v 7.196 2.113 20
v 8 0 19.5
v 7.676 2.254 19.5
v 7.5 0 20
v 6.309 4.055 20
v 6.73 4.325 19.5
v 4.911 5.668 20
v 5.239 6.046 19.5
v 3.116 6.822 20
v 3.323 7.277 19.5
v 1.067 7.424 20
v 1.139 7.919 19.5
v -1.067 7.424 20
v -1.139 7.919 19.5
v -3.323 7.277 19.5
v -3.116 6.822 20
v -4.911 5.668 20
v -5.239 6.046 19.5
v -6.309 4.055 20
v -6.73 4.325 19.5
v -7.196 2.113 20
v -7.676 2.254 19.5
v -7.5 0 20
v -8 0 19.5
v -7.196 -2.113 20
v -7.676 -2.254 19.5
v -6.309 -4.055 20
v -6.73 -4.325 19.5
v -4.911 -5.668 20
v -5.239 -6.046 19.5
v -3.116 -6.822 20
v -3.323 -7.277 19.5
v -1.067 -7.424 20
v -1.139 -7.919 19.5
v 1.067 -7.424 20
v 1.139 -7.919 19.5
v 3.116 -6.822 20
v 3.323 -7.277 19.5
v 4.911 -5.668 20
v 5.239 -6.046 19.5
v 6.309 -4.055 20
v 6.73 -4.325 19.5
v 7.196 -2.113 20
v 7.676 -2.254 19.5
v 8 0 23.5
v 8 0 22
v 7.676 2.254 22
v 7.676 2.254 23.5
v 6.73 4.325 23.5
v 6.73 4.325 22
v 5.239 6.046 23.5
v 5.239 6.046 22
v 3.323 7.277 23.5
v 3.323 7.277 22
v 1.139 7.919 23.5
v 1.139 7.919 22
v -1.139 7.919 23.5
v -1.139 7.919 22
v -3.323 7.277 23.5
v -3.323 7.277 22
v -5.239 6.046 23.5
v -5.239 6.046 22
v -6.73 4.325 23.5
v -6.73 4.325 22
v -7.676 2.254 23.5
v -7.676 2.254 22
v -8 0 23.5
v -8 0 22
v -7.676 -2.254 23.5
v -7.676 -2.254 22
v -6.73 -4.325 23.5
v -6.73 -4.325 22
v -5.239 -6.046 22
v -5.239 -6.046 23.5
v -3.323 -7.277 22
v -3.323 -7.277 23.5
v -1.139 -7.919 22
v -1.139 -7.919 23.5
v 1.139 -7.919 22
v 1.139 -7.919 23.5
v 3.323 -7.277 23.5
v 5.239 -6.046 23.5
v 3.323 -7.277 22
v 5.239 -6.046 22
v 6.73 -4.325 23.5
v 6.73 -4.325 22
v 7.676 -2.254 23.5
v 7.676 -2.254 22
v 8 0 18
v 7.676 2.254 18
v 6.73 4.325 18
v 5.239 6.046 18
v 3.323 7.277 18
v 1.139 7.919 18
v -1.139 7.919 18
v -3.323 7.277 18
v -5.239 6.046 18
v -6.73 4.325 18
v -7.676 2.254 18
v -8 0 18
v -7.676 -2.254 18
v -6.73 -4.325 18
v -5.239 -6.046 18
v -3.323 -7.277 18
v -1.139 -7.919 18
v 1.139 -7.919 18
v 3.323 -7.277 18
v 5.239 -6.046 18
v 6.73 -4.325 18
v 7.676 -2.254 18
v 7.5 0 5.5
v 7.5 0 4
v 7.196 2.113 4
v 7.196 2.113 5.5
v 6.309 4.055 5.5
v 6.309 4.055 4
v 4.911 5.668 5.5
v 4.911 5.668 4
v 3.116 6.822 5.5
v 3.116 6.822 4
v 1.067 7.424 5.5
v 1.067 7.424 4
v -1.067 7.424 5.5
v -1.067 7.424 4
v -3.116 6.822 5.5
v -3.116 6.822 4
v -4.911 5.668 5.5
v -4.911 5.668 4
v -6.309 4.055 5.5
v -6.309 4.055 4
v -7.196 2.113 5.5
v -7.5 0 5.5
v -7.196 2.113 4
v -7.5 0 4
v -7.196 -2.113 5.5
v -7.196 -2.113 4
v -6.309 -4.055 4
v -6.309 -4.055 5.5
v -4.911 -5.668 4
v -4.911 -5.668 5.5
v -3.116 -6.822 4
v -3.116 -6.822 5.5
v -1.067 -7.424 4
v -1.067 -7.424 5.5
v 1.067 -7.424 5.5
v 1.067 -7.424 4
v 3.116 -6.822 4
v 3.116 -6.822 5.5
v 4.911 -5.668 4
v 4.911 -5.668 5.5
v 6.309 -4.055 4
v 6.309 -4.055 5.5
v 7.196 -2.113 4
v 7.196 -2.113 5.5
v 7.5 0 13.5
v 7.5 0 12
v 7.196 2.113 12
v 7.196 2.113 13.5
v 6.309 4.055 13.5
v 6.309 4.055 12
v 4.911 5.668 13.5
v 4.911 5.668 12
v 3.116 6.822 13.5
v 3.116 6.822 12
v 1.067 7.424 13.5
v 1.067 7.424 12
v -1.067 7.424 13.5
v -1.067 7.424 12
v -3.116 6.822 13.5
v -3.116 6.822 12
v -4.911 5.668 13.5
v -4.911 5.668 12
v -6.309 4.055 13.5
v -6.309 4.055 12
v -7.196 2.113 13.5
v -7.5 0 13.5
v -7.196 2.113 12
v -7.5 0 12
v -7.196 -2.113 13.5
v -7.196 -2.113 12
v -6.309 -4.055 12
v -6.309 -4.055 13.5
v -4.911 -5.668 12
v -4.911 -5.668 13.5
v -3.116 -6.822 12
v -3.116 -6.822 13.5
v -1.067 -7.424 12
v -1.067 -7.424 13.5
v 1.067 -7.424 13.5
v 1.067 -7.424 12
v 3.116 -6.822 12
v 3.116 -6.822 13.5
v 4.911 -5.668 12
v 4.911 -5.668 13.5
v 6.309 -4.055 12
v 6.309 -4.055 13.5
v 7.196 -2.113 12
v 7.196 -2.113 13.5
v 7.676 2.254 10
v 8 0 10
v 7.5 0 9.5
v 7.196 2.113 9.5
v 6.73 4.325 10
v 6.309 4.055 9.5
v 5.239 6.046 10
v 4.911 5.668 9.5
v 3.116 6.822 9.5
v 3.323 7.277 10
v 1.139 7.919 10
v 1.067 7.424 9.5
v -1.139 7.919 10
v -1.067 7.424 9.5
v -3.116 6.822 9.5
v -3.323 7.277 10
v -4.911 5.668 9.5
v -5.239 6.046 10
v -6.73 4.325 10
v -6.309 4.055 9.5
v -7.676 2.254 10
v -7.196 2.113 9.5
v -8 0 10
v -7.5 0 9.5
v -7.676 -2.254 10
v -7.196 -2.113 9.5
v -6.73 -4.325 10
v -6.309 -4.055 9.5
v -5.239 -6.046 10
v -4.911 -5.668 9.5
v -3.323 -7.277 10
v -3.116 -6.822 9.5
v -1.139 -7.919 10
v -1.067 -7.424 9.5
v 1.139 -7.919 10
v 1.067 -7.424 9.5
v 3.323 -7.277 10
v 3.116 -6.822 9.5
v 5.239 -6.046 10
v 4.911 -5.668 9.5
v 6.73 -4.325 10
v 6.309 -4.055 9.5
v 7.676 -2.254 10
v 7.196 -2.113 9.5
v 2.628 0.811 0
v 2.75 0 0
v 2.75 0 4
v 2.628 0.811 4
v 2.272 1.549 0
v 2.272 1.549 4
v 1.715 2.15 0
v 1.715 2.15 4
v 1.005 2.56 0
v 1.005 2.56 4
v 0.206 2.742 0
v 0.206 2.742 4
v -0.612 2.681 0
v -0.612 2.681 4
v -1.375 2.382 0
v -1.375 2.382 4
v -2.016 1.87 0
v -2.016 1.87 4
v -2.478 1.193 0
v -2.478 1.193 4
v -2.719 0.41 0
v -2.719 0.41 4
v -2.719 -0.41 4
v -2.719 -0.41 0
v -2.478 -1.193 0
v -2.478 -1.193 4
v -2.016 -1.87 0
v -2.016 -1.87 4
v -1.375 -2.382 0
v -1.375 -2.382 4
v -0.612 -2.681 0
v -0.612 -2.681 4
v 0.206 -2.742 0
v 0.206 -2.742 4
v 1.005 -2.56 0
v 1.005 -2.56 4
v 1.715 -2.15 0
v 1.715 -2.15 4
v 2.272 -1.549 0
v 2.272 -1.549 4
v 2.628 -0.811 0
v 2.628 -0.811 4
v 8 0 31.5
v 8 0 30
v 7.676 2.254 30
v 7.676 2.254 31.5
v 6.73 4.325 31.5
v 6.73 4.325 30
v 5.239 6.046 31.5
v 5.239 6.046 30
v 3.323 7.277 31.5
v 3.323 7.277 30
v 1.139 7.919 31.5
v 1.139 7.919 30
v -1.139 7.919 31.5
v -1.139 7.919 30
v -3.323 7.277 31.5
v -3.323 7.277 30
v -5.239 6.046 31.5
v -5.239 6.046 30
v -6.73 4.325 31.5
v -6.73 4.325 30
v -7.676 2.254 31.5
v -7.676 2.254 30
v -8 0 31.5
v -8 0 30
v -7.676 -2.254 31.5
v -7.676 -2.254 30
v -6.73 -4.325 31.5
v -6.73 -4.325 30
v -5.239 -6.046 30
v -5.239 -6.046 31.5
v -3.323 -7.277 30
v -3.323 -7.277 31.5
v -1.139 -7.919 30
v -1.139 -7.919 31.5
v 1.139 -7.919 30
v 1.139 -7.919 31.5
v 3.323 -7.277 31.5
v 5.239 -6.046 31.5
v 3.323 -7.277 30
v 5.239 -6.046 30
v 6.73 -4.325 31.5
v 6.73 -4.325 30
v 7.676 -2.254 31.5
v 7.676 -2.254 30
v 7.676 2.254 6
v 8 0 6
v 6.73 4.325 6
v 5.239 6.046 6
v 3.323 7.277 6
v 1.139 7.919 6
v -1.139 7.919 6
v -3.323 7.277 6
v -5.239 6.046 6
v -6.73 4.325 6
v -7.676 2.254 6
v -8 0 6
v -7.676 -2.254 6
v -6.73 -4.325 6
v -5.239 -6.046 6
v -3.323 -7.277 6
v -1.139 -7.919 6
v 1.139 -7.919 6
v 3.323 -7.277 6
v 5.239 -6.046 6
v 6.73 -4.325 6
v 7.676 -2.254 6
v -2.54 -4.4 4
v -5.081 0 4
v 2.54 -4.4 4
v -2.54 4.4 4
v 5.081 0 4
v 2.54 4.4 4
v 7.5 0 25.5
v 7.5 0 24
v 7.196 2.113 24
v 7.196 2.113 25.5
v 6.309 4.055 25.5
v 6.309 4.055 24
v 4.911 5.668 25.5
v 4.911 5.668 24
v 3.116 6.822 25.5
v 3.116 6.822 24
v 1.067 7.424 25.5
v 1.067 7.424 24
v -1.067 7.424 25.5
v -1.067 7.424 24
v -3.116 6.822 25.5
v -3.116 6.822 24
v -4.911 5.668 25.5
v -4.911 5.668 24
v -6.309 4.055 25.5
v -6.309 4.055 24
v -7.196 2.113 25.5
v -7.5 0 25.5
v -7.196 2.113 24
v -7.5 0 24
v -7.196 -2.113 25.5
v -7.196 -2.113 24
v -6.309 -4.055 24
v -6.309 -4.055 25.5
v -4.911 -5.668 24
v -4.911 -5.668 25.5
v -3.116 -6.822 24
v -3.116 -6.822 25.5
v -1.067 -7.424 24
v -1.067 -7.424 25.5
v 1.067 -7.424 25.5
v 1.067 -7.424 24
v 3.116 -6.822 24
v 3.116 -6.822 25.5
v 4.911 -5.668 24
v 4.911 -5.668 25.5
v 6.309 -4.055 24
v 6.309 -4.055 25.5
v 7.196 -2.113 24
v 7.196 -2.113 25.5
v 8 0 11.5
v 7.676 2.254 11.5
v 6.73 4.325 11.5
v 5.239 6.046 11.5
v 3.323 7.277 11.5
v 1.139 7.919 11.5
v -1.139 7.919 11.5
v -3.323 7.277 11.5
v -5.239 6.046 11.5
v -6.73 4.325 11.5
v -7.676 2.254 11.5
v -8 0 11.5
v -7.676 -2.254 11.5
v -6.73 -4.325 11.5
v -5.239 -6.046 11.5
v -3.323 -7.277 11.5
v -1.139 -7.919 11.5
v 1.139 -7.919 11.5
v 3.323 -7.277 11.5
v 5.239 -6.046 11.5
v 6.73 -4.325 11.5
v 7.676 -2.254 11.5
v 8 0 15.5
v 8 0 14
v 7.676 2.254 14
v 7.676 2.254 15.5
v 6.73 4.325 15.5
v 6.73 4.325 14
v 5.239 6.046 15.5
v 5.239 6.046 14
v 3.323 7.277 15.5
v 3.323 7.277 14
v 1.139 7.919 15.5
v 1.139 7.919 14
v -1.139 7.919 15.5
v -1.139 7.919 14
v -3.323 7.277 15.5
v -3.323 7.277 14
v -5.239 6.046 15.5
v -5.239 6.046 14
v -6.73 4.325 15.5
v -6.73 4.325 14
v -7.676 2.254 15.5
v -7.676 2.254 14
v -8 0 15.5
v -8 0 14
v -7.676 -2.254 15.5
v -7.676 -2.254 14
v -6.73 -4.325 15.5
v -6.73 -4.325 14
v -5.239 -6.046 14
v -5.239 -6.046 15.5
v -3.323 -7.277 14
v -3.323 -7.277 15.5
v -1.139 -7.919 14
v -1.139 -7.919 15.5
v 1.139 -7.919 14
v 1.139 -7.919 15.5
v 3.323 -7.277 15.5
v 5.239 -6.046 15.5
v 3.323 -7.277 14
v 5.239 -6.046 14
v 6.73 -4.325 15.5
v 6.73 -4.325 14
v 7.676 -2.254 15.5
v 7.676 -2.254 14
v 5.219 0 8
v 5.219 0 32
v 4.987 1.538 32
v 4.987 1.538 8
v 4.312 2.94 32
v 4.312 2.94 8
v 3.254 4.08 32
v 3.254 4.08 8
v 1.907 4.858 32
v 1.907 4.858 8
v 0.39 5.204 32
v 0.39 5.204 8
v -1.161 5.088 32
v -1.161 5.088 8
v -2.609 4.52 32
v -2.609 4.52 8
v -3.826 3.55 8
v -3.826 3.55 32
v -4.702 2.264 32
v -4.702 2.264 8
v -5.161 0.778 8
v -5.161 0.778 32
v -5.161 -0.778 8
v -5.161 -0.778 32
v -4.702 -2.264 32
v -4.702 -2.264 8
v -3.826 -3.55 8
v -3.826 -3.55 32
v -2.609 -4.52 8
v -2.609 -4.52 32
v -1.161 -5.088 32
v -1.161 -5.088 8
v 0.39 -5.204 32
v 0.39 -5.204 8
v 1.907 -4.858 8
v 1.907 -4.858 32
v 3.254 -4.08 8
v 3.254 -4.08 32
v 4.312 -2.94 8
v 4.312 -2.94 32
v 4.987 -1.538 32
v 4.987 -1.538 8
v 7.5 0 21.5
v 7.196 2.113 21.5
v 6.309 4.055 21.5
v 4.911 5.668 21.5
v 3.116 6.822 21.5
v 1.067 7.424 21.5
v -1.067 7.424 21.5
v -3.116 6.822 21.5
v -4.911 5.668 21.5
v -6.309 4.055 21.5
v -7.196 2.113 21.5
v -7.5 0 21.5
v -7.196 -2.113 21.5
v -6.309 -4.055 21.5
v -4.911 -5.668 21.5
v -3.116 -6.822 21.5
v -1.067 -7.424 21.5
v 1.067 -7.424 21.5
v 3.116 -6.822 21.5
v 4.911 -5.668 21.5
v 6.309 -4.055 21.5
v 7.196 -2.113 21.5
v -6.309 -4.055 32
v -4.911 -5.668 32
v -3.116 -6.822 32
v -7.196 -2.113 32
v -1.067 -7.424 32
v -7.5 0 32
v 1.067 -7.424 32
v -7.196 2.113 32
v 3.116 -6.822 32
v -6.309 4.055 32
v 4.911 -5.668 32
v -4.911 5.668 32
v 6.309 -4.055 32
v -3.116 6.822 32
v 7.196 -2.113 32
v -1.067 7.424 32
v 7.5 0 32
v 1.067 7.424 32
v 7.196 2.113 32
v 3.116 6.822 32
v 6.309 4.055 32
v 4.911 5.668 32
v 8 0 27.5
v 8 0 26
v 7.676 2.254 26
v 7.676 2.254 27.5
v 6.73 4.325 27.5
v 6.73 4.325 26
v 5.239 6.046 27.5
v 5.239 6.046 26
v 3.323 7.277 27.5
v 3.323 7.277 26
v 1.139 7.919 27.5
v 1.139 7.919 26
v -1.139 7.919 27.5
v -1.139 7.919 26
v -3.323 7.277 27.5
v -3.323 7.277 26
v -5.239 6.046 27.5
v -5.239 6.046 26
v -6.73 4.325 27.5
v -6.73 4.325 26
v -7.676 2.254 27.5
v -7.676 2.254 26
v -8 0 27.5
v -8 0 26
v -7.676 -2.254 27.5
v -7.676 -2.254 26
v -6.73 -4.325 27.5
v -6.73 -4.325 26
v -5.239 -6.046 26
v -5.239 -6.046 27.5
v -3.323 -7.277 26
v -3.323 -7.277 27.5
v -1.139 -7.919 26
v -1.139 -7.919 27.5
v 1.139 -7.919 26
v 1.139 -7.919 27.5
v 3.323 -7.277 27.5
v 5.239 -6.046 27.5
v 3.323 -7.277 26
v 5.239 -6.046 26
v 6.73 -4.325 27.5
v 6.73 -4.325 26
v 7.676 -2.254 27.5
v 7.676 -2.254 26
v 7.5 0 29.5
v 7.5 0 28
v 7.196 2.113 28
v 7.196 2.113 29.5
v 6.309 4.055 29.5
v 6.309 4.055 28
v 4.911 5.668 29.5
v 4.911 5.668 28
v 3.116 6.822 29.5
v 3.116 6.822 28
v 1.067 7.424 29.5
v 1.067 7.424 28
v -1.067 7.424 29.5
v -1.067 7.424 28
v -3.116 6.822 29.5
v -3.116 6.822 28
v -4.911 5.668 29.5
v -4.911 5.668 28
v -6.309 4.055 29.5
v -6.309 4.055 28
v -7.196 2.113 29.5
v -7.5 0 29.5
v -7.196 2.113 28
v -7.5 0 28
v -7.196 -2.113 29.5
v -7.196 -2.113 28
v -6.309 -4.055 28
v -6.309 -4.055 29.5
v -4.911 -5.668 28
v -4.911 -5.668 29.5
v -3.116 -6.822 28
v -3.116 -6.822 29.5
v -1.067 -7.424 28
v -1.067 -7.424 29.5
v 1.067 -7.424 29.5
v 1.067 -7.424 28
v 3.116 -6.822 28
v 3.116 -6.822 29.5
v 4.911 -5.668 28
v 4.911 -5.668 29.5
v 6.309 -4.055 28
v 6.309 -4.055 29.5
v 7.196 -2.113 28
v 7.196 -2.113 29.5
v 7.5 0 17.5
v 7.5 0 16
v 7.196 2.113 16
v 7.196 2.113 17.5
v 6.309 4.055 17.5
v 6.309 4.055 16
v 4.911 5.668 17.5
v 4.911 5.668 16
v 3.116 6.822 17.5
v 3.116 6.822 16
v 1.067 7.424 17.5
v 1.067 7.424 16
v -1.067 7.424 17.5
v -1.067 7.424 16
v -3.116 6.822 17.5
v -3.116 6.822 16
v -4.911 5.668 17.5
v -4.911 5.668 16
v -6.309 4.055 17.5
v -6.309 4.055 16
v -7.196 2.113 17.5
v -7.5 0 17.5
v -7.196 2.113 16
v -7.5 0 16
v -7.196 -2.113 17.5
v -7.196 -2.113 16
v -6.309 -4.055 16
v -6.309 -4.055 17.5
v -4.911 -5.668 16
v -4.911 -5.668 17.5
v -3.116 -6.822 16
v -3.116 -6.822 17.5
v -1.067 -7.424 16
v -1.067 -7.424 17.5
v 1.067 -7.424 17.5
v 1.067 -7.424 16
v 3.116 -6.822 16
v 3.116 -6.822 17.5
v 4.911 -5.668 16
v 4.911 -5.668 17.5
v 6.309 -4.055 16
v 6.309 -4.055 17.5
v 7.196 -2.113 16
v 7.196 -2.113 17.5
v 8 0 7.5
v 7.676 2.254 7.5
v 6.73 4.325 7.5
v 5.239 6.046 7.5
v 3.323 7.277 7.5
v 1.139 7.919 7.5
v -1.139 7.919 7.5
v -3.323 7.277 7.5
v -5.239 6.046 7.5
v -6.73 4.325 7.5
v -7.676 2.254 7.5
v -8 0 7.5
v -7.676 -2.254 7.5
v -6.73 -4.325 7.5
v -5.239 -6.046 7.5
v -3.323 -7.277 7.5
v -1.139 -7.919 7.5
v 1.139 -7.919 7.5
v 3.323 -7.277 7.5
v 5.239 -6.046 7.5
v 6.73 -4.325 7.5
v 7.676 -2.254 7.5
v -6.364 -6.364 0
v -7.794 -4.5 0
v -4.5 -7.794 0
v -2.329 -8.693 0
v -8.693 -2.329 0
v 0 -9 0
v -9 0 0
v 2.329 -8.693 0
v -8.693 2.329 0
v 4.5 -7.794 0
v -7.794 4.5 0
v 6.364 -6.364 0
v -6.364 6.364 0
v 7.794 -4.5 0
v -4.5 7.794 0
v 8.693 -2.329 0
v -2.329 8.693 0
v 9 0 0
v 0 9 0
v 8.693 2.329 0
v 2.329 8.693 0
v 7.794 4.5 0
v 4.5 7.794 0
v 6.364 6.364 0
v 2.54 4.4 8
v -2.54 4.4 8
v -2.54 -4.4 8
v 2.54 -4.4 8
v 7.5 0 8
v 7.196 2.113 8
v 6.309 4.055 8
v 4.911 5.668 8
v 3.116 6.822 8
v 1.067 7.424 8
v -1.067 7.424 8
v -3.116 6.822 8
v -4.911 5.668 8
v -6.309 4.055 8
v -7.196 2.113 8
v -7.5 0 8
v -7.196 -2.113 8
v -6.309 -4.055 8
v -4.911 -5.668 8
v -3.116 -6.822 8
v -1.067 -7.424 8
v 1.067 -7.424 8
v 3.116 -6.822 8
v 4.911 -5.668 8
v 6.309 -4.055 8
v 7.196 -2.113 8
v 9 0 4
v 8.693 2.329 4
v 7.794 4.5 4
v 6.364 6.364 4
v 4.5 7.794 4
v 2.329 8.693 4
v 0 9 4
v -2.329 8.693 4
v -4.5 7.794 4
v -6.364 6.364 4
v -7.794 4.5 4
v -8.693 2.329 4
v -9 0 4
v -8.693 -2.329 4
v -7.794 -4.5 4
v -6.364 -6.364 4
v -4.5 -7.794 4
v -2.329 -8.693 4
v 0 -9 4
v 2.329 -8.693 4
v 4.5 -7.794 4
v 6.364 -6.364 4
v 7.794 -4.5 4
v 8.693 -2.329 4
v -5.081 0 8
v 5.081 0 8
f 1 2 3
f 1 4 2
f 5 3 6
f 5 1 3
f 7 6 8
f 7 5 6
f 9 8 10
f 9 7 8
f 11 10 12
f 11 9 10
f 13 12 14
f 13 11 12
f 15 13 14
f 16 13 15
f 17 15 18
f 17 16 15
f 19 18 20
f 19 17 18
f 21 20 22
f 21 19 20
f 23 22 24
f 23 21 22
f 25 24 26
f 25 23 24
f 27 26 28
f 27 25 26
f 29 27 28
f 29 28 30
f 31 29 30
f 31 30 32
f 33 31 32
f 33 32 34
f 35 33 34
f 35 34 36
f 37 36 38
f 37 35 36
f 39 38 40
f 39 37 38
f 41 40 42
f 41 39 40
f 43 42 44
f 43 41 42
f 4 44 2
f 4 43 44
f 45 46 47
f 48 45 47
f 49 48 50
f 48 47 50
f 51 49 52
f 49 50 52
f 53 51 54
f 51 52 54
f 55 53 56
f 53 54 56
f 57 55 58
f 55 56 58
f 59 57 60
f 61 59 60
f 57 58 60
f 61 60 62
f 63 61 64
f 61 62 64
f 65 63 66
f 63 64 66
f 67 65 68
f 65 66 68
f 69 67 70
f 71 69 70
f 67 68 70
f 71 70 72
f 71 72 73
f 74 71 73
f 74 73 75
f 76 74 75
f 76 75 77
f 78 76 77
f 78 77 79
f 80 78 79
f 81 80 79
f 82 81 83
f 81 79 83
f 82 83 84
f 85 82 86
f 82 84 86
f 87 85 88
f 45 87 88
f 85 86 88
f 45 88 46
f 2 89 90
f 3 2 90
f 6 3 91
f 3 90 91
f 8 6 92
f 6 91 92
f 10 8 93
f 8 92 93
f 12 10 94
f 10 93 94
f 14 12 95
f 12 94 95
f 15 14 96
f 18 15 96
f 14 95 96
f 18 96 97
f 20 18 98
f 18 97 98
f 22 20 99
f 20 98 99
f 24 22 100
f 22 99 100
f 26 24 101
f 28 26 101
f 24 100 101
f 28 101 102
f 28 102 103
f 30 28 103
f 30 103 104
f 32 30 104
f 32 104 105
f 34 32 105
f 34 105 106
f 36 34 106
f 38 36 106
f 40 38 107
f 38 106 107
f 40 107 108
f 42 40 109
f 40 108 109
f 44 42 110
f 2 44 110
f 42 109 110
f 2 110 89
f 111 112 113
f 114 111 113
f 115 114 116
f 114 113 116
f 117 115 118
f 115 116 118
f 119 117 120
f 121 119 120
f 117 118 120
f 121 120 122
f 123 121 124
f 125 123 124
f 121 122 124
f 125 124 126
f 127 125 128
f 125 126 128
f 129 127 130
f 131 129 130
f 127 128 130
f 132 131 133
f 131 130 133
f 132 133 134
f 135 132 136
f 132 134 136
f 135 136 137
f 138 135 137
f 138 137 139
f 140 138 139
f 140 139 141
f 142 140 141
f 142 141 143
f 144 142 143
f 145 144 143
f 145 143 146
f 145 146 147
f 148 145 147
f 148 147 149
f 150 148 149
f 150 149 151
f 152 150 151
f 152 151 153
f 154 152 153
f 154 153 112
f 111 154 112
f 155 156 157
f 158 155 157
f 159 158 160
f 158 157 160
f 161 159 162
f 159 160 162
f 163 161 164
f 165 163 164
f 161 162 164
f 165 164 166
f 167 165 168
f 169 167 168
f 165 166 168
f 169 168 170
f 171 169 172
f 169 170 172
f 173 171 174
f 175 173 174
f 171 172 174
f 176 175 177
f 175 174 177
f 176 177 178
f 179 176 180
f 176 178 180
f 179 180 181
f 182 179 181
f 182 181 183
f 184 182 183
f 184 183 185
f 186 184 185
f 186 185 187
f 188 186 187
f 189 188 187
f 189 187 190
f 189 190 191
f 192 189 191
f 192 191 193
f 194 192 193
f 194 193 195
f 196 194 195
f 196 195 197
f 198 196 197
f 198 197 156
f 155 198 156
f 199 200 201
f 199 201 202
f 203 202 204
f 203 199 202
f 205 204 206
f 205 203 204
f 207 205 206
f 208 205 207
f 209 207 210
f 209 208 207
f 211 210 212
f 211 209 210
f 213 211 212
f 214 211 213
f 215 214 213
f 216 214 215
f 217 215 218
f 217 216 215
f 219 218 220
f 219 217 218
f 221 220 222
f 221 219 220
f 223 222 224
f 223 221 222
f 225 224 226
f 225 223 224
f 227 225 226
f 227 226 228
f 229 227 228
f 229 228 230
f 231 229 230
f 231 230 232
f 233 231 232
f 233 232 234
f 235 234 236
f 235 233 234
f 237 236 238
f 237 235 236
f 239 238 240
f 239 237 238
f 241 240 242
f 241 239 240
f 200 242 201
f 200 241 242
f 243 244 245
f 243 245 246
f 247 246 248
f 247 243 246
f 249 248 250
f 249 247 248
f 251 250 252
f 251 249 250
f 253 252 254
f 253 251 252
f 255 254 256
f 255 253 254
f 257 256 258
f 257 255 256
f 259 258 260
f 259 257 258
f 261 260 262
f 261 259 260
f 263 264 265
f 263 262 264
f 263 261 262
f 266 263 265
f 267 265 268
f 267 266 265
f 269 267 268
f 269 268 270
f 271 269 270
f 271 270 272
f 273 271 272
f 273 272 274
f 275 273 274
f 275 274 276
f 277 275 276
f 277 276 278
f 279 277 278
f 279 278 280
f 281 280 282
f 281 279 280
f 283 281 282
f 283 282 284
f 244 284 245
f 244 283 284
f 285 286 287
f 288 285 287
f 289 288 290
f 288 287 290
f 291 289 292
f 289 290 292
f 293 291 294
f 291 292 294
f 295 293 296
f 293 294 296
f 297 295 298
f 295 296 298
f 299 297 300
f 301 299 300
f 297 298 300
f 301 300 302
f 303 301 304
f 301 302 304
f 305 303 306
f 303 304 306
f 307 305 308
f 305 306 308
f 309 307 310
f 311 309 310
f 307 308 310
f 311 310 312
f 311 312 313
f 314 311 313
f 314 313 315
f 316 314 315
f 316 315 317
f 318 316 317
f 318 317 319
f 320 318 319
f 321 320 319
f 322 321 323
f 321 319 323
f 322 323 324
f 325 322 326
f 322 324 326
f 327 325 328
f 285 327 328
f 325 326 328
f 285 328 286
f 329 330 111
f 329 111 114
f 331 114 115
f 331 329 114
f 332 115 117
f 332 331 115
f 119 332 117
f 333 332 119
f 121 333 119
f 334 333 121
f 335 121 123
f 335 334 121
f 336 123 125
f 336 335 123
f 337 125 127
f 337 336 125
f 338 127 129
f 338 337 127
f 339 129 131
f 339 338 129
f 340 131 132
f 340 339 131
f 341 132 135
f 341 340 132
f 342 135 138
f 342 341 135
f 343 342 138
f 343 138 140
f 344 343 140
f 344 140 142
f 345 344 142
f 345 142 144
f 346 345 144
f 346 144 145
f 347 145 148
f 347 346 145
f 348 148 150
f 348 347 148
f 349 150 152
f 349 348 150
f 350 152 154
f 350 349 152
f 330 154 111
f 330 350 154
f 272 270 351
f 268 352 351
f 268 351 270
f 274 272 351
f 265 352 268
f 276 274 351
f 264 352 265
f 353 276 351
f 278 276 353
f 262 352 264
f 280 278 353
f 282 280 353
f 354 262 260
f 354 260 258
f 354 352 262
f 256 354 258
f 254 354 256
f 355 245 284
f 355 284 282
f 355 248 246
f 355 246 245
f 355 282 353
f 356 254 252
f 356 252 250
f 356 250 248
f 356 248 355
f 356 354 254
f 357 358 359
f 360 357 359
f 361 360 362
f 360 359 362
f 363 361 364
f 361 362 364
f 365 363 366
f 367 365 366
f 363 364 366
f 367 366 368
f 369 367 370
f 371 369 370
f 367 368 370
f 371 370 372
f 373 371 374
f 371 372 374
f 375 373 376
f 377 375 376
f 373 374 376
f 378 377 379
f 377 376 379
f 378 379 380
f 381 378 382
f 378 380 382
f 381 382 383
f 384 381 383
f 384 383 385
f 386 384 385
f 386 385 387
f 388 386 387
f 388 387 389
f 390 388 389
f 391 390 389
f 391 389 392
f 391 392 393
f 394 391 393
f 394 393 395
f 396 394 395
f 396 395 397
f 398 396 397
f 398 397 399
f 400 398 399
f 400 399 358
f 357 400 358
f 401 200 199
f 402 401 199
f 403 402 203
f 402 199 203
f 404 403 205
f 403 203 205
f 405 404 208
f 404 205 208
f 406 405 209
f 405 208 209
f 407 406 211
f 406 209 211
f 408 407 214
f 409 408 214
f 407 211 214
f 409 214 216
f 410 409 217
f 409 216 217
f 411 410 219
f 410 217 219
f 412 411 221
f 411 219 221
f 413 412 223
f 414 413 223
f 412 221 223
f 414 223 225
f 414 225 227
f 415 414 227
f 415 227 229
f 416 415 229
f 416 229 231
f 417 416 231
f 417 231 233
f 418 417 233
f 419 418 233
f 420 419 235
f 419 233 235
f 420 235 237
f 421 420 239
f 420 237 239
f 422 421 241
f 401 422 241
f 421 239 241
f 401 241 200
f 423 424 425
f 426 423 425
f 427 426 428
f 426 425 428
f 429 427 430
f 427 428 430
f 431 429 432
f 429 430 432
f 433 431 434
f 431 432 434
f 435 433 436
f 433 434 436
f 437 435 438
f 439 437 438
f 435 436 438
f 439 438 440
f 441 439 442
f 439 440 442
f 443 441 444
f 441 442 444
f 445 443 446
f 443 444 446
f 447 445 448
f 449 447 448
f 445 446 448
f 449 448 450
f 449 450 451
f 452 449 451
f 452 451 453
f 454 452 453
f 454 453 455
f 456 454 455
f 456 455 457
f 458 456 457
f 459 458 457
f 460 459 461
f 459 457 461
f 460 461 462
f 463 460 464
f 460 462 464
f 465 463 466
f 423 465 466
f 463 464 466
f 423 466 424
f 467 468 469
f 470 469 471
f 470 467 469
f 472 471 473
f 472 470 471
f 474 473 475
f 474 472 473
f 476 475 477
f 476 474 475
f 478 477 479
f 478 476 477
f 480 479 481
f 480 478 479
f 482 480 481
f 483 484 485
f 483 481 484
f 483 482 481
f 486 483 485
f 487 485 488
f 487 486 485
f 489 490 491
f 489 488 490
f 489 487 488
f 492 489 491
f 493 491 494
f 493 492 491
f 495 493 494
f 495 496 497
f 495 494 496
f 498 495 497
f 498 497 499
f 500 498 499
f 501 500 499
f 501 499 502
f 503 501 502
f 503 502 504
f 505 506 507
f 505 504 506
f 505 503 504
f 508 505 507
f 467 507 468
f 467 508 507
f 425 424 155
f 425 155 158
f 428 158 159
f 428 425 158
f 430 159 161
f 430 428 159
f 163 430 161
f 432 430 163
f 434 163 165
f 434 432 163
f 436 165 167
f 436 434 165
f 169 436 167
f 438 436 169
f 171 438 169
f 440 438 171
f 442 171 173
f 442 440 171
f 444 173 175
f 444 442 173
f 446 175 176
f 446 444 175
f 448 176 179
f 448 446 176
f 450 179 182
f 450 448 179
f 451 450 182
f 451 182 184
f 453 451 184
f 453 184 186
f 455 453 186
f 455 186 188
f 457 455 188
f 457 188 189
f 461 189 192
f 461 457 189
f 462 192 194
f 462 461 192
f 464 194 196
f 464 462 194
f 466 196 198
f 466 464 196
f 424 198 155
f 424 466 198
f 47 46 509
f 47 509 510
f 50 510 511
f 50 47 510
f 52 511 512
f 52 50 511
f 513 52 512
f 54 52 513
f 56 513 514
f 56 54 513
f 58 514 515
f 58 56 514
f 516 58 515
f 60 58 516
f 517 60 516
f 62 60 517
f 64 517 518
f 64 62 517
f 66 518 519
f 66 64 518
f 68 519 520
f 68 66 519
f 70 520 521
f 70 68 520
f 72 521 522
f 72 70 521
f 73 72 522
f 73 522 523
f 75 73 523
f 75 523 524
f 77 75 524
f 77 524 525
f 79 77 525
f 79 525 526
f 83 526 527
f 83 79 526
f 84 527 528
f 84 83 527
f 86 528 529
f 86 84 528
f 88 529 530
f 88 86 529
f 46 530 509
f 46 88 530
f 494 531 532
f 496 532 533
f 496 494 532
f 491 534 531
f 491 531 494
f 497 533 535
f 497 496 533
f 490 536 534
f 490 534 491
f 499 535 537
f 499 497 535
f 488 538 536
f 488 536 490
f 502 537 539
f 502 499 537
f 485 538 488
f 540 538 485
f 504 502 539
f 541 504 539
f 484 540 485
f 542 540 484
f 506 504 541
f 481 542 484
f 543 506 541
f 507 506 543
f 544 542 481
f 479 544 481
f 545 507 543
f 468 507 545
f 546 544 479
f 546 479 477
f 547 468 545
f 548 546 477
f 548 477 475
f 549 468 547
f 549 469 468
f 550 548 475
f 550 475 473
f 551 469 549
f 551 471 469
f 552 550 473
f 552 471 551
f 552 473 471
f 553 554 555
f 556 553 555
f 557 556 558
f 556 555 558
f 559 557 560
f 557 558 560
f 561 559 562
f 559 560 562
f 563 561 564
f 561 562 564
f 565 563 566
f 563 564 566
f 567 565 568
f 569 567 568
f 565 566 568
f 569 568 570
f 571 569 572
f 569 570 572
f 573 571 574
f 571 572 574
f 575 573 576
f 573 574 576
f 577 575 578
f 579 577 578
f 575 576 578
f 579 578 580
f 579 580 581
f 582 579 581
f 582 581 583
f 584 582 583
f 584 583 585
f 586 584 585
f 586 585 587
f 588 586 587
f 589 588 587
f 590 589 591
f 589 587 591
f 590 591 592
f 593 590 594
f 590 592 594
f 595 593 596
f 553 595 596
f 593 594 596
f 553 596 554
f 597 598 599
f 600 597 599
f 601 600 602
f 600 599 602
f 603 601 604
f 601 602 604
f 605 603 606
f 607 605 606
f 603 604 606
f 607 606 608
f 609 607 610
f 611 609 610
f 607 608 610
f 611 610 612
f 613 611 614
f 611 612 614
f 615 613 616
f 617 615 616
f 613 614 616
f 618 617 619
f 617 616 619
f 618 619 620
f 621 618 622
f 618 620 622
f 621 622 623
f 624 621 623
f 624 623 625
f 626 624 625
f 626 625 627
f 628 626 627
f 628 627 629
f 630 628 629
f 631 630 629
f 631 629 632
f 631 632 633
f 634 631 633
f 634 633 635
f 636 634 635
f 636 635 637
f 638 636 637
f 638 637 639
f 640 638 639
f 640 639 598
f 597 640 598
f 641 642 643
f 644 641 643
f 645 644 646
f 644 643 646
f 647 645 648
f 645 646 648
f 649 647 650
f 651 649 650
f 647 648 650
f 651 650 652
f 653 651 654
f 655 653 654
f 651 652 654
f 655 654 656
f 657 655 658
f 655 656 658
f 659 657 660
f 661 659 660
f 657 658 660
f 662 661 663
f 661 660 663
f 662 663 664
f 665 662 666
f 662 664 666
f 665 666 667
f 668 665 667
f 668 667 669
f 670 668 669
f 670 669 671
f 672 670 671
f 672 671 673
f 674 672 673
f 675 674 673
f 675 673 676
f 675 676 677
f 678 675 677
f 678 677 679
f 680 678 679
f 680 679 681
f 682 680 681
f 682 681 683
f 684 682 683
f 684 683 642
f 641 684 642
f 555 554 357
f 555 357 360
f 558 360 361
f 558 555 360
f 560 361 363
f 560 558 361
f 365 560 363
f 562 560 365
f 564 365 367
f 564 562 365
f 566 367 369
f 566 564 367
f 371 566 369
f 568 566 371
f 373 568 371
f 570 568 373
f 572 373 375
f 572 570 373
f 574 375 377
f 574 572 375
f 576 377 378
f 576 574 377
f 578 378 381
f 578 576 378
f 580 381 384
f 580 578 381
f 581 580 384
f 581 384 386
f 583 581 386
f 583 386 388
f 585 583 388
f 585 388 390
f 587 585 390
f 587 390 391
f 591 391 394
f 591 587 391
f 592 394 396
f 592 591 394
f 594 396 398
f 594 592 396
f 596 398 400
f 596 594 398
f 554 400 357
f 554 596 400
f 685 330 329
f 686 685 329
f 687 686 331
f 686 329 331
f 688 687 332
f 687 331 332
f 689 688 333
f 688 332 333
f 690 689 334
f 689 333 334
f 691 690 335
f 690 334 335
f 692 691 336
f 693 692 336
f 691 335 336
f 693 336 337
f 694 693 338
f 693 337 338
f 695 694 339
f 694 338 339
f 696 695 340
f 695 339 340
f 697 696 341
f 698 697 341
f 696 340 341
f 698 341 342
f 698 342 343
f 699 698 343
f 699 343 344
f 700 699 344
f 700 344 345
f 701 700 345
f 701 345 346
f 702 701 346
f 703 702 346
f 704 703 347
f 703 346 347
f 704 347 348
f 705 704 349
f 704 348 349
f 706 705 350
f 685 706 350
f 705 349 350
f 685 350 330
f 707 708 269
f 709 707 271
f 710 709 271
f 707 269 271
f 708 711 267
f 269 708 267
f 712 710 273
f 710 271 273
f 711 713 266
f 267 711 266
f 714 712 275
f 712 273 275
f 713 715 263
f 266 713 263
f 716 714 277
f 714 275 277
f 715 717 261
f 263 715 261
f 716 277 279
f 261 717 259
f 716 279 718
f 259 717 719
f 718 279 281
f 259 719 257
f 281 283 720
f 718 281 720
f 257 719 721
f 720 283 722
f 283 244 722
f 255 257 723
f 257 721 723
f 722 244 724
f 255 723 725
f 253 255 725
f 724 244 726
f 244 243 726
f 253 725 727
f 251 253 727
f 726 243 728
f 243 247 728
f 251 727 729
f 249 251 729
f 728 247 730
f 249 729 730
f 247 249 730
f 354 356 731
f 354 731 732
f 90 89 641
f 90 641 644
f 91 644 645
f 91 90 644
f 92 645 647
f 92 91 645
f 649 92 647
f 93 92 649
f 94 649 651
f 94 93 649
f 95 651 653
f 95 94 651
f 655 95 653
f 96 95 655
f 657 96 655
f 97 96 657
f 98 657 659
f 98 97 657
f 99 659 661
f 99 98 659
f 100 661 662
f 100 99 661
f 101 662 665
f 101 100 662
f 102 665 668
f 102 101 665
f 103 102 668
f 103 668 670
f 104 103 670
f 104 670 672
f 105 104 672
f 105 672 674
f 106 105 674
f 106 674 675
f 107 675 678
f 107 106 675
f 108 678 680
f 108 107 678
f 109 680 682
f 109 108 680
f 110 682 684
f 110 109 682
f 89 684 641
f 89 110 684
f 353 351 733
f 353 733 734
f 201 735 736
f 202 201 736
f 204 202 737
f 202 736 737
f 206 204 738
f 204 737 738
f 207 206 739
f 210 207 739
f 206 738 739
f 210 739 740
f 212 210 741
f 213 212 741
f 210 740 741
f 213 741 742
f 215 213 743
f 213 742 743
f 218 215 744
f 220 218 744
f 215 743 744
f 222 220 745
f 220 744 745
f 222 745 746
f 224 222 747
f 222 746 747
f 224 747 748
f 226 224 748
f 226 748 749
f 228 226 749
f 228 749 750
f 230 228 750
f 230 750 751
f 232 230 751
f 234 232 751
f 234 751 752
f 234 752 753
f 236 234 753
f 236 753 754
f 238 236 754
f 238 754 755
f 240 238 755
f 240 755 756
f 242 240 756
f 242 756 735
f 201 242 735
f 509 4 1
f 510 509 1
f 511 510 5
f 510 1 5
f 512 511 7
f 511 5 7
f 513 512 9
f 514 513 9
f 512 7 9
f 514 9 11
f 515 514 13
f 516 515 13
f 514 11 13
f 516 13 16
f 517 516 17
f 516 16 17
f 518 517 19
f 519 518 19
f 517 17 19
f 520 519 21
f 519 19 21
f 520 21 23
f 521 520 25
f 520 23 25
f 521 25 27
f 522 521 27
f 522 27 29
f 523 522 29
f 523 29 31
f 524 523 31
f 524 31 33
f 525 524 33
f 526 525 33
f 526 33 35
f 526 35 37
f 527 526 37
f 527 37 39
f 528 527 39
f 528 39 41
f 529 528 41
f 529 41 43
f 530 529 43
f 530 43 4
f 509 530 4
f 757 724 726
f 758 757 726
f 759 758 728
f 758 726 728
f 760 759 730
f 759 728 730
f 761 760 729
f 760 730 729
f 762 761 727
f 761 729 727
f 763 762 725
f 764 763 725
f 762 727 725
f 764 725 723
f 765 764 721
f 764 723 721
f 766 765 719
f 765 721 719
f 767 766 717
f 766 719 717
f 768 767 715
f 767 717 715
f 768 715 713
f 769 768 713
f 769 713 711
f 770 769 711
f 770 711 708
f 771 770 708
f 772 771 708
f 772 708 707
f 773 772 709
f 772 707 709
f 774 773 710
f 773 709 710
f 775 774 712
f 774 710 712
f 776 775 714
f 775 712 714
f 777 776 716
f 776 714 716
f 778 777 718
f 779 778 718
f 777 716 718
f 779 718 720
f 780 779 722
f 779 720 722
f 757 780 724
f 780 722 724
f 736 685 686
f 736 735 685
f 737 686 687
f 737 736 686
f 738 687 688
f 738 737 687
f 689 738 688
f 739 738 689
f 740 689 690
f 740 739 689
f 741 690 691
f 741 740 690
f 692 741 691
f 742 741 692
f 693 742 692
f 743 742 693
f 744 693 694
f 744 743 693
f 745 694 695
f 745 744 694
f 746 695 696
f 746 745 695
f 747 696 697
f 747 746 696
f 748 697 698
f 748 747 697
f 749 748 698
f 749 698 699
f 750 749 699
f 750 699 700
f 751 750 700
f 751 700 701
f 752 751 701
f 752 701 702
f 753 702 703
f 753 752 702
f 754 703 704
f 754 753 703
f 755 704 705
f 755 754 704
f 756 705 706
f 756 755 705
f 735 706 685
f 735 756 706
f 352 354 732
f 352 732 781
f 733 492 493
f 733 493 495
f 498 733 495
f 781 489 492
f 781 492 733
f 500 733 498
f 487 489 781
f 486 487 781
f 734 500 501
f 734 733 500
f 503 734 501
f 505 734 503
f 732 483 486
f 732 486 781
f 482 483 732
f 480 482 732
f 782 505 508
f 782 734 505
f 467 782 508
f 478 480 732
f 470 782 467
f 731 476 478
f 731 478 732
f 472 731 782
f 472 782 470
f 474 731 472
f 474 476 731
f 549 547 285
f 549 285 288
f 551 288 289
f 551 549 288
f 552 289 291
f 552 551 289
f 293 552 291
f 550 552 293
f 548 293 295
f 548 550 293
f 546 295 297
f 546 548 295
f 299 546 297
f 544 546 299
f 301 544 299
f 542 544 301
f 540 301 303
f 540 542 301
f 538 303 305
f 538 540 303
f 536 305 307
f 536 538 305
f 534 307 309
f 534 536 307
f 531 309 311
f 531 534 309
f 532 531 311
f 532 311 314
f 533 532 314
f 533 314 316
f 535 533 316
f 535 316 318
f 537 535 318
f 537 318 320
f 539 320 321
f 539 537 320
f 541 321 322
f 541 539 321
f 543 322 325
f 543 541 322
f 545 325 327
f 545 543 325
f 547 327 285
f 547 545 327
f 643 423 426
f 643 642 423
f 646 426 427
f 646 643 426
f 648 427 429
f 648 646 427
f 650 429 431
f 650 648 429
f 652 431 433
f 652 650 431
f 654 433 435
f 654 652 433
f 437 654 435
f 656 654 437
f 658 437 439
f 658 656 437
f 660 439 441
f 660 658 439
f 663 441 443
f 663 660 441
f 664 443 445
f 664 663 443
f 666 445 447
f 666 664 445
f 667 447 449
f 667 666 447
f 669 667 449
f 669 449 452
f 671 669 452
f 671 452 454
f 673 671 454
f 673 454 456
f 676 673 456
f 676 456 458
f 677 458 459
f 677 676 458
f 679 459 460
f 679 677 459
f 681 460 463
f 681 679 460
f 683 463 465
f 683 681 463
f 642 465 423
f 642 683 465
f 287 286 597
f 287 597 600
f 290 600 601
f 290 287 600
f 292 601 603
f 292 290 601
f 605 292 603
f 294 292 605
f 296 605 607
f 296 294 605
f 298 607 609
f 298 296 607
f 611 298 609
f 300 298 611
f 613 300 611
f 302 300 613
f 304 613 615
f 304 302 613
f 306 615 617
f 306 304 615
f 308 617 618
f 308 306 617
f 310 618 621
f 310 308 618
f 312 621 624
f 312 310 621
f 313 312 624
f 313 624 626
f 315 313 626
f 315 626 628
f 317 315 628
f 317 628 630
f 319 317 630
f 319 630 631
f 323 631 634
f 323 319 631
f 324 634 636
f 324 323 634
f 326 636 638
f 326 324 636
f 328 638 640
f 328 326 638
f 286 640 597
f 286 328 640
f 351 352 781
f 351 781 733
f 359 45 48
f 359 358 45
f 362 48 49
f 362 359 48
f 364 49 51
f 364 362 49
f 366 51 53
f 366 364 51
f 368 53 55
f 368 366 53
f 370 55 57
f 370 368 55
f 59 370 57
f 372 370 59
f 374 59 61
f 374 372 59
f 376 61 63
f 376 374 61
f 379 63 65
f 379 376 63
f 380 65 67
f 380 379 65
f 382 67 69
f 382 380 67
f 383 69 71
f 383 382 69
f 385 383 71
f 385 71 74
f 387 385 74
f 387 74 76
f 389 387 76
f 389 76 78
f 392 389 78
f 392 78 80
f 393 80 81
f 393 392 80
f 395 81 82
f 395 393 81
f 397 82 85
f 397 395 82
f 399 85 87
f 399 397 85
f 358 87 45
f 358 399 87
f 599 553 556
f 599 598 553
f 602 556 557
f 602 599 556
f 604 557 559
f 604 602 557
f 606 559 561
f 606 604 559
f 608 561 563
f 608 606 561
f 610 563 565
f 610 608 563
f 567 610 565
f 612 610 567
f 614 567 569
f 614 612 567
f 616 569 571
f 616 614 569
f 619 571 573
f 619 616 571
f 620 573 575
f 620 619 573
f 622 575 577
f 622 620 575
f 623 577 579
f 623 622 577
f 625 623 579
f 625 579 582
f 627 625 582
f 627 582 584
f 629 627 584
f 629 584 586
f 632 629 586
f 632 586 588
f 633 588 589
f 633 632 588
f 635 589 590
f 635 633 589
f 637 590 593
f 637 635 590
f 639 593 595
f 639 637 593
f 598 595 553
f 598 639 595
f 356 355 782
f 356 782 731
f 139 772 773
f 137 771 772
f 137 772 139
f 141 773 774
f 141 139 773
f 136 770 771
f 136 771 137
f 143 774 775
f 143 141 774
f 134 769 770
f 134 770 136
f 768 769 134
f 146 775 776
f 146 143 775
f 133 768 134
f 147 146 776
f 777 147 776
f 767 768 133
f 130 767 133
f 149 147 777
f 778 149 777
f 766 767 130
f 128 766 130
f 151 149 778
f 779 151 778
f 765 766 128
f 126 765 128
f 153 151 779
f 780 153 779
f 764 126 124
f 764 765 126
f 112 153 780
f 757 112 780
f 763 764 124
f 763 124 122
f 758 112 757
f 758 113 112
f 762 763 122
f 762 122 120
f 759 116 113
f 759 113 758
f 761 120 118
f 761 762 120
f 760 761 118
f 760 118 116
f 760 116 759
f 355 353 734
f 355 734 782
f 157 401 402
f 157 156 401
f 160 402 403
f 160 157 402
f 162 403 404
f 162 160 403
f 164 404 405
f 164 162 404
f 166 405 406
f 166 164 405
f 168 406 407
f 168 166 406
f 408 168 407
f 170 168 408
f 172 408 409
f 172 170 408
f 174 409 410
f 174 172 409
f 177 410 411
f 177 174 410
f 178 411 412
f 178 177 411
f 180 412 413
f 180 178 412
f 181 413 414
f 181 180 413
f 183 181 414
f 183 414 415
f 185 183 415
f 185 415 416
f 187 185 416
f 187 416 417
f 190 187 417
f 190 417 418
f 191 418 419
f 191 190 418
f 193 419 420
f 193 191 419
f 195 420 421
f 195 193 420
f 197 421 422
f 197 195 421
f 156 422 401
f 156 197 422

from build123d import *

# Parameters (mm, degrees)
PRISM_DEPTH       = 31
CYLINDER030_R     = 2.75
CYLINDER030_DEPTH = 6
CYLINDER029_R     = 5.2188
CYLINDER029_DEPTH = 31
CYLINDER007_R     = 8
CYLINDER007_DEPTH = 1.5
CYLINDER005_R     = 7.5
CYLINDER005_DEPTH = 2
CYLINDER011_R     = 8
CYLINDER011_DEPTH = 1.5
CYLINDER009_R     = 7.5
CYLINDER009_DEPTH = 2
CYLINDER015_R     = 8
CYLINDER015_DEPTH = 1.5
CYLINDER013_R     = 7.5
CYLINDER013_DEPTH = 2
CYLINDER019_R     = 8
CYLINDER019_DEPTH = 1.5
CYLINDER017_R     = 7.5
CYLINDER017_DEPTH = 2
CYLINDER023_R     = 8
CYLINDER023_DEPTH = 1.5
CYLINDER021_R     = 7.5
CYLINDER021_DEPTH = 2
CYLINDER027_R     = 8
CYLINDER027_DEPTH = 1.5
CYLINDER025_R     = 7.5
CYLINDER025_DEPTH = 2
CYLINDER003_R     = 8
CYLINDER003_DEPTH = 1.5
CYLINDER001_R     = 7.5
CYLINDER001_DEPTH = 2
CYLINDER_R        = 9
CYLINDER_DEPTH    = 4


with BuildPart() as prism:
    # prism → prism (new body)
    with BuildSketch(Plane.XY.offset(4)):
        Polygon((5.08068, 0), (2.54034, 4.399998), (-2.54034, 4.399998), (-5.08068, 0), (-2.54034, -4.399998), (2.54034, -4.399998), align=None)
    extrude(amount=PRISM_DEPTH)


with BuildPart() as cylinder030:
    # cylinder030 → cylinder030 (new body)
    with BuildSketch(Plane.XY.offset(-1)):
        Circle(CYLINDER030_R)
    extrude(amount=CYLINDER030_DEPTH)


with BuildPart() as union001:
    # cylinder029 → cylinder029 (new body)
    with BuildSketch(Plane.XY.offset(8)):
        Circle(CYLINDER029_R)
    extrude(amount=CYLINDER029_DEPTH)

    # union001: union prism, cylinder030
    add(prism.part)
    add(cylinder030.part)


with BuildPart() as cylinder006:
    # cylinder006 → cylinder006 (revolve)
    with BuildSketch(Plane(origin=(0, 0, 1.5), x_dir=(1, 0, 0), z_dir=(0, -1, 0))):
        Polygon((0, 0), (7.5, 0), (8, 0.5), (0, 0.5), align=None)
    revolve(axis=Axis((0, 0, 1.5), (0, 0, 1)))


with BuildPart() as cylinder007:
    # cylinder007 → cylinder007 (new body)
    with BuildSketch(Plane.XY.offset(2)):
        Circle(CYLINDER007_R)
    extrude(amount=CYLINDER007_DEPTH)


with BuildPart() as cylinder008:
    # cylinder008 → cylinder008 (revolve)
    with BuildSketch(Plane(origin=(0, 0, 3.5), x_dir=(1, 0, 0), z_dir=(0, -1, 0))):
        Polygon((0, 0), (8, 0), (7.5, 0.5), (0, 0.5), align=None)
    revolve(axis=Axis((0, 0, 3.5), (0, 0, 1)))


with BuildPart() as matrix_union001:
    # cylinder005 → cylinder005 (new body)
    with BuildSketch(Plane.XY):
        Circle(CYLINDER005_R)
    extrude(amount=CYLINDER005_DEPTH)

    # Matrix_Union001: union cylinder006, cylinder007, cylinder008
    add(cylinder006.part)
    add(cylinder007.part)
    add(cylinder008.part)


with BuildPart() as matrix_union001_1:
    # Matrix_Union001 placement: moved
    add(matrix_union001.part.moved(Location((0, 0, 4))))


with BuildPart() as cylinder010:
    # cylinder010 → cylinder010 (revolve)
    with BuildSketch(Plane(origin=(0, 0, 1.5), x_dir=(1, 0, 0), z_dir=(0, -1, 0))):
        Polygon((0, 0), (7.5, 0), (8, 0.5), (0, 0.5), align=None)
    revolve(axis=Axis((0, 0, 1.5), (0, 0, 1)))


with BuildPart() as cylinder011:
    # cylinder011 → cylinder011 (new body)
    with BuildSketch(Plane.XY.offset(2)):
        Circle(CYLINDER011_R)
    extrude(amount=CYLINDER011_DEPTH)


with BuildPart() as cylinder012:
    # cylinder012 → cylinder012 (revolve)
    with BuildSketch(Plane(origin=(0, 0, 3.5), x_dir=(1, 0, 0), z_dir=(0, -1, 0))):
        Polygon((0, 0), (8, 0), (7.5, 0.5), (0, 0.5), align=None)
    revolve(axis=Axis((0, 0, 3.5), (0, 0, 1)))


with BuildPart() as matrix_union002:
    # cylinder009 → cylinder009 (new body)
    with BuildSketch(Plane.XY):
        Circle(CYLINDER009_R)
    extrude(amount=CYLINDER009_DEPTH)

    # Matrix_Union002: union cylinder010, cylinder011, cylinder012
    add(cylinder010.part)
    add(cylinder011.part)
    add(cylinder012.part)


with BuildPart() as matrix_union002_1:
    # Matrix_Union002 placement: moved
    add(matrix_union002.part.moved(Location((0, 0, 8))))


with BuildPart() as cylinder014:
    # cylinder014 → cylinder014 (revolve)
    with BuildSketch(Plane(origin=(0, 0, 1.5), x_dir=(1, 0, 0), z_dir=(0, -1, 0))):
        Polygon((0, 0), (7.5, 0), (8, 0.5), (0, 0.5), align=None)
    revolve(axis=Axis((0, 0, 1.5), (0, 0, 1)))


with BuildPart() as cylinder015:
    # cylinder015 → cylinder015 (new body)
    with BuildSketch(Plane.XY.offset(2)):
        Circle(CYLINDER015_R)
    extrude(amount=CYLINDER015_DEPTH)


with BuildPart() as cylinder016:
    # cylinder016 → cylinder016 (revolve)
    with BuildSketch(Plane(origin=(0, 0, 3.5), x_dir=(1, 0, 0), z_dir=(0, -1, 0))):
        Polygon((0, 0), (8, 0), (7.5, 0.5), (0, 0.5), align=None)
    revolve(axis=Axis((0, 0, 3.5), (0, 0, 1)))


with BuildPart() as matrix_union003:
    # cylinder013 → cylinder013 (new body)
    with BuildSketch(Plane.XY):
        Circle(CYLINDER013_R)
    extrude(amount=CYLINDER013_DEPTH)

    # Matrix_Union003: union cylinder014, cylinder015, cylinder016
    add(cylinder014.part)
    add(cylinder015.part)
    add(cylinder016.part)


with BuildPart() as matrix_union003_1:
    # Matrix_Union003 placement: moved
    add(matrix_union003.part.moved(Location((0, 0, 12))))


with BuildPart() as cylinder018:
    # cylinder018 → cylinder018 (revolve)
    with BuildSketch(Plane(origin=(0, 0, 1.5), x_dir=(1, 0, 0), z_dir=(0, -1, 0))):
        Polygon((0, 0), (7.5, 0), (8, 0.5), (0, 0.5), align=None)
    revolve(axis=Axis((0, 0, 1.5), (0, 0, 1)))


with BuildPart() as cylinder019:
    # cylinder019 → cylinder019 (new body)
    with BuildSketch(Plane.XY.offset(2)):
        Circle(CYLINDER019_R)
    extrude(amount=CYLINDER019_DEPTH)


with BuildPart() as cylinder020:
    # cylinder020 → cylinder020 (revolve)
    with BuildSketch(Plane(origin=(0, 0, 3.5), x_dir=(1, 0, 0), z_dir=(0, -1, 0))):
        Polygon((0, 0), (8, 0), (7.5, 0.5), (0, 0.5), align=None)
    revolve(axis=Axis((0, 0, 3.5), (0, 0, 1)))


with BuildPart() as matrix_union004:
    # cylinder017 → cylinder017 (new body)
    with BuildSketch(Plane.XY):
        Circle(CYLINDER017_R)
    extrude(amount=CYLINDER017_DEPTH)

    # Matrix_Union004: union cylinder018, cylinder019, cylinder020
    add(cylinder018.part)
    add(cylinder019.part)
    add(cylinder020.part)


with BuildPart() as matrix_union004_1:
    # Matrix_Union004 placement: moved
    add(matrix_union004.part.moved(Location((0, 0, 16))))


with BuildPart() as cylinder022:
    # cylinder022 → cylinder022 (revolve)
    with BuildSketch(Plane(origin=(0, 0, 1.5), x_dir=(1, 0, 0), z_dir=(0, -1, 0))):
        Polygon((0, 0), (7.5, 0), (8, 0.5), (0, 0.5), align=None)
    revolve(axis=Axis((0, 0, 1.5), (0, 0, 1)))


with BuildPart() as cylinder023:
    # cylinder023 → cylinder023 (new body)
    with BuildSketch(Plane.XY.offset(2)):
        Circle(CYLINDER023_R)
    extrude(amount=CYLINDER023_DEPTH)


with BuildPart() as cylinder024:
    # cylinder024 → cylinder024 (revolve)
    with BuildSketch(Plane(origin=(0, 0, 3.5), x_dir=(1, 0, 0), z_dir=(0, -1, 0))):
        Polygon((0, 0), (8, 0), (7.5, 0.5), (0, 0.5), align=None)
    revolve(axis=Axis((0, 0, 3.5), (0, 0, 1)))


with BuildPart() as matrix_union005:
    # cylinder021 → cylinder021 (new body)
    with BuildSketch(Plane.XY):
        Circle(CYLINDER021_R)
    extrude(amount=CYLINDER021_DEPTH)

    # Matrix_Union005: union cylinder022, cylinder023, cylinder024
    add(cylinder022.part)
    add(cylinder023.part)
    add(cylinder024.part)


with BuildPart() as matrix_union005_1:
    # Matrix_Union005 placement: moved
    add(matrix_union005.part.moved(Location((0, 0, 20))))


with BuildPart() as cylinder026:
    # cylinder026 → cylinder026 (revolve)
    with BuildSketch(Plane(origin=(0, 0, 1.5), x_dir=(1, 0, 0), z_dir=(0, -1, 0))):
        Polygon((0, 0), (7.5, 0), (8, 0.5), (0, 0.5), align=None)
    revolve(axis=Axis((0, 0, 1.5), (0, 0, 1)))


with BuildPart() as cylinder027:
    # cylinder027 → cylinder027 (new body)
    with BuildSketch(Plane.XY.offset(2)):
        Circle(CYLINDER027_R)
    extrude(amount=CYLINDER027_DEPTH)


with BuildPart() as cylinder028:
    # cylinder028 → cylinder028 (revolve)
    with BuildSketch(Plane(origin=(0, 0, 3.5), x_dir=(1, 0, 0), z_dir=(0, -1, 0))):
        Polygon((0, 0), (8, 0), (7.5, 0.5), (0, 0.5), align=None)
    revolve(axis=Axis((0, 0, 3.5), (0, 0, 1)))


with BuildPart() as matrix_union006:
    # cylinder025 → cylinder025 (new body)
    with BuildSketch(Plane.XY):
        Circle(CYLINDER025_R)
    extrude(amount=CYLINDER025_DEPTH)

    # Matrix_Union006: union cylinder026, cylinder027, cylinder028
    add(cylinder026.part)
    add(cylinder027.part)
    add(cylinder028.part)


with BuildPart() as matrix_union006_1:
    # Matrix_Union006 placement: moved
    add(matrix_union006.part.moved(Location((0, 0, 24))))


with BuildPart() as cylinder002:
    # cylinder002 → cylinder002 (revolve)
    with BuildSketch(Plane(origin=(0, 0, 1.5), x_dir=(1, 0, 0), z_dir=(0, -1, 0))):
        Polygon((0, 0), (7.5, 0), (8, 0.5), (0, 0.5), align=None)
    revolve(axis=Axis((0, 0, 1.5), (0, 0, 1)))


with BuildPart() as cylinder003:
    # cylinder003 → cylinder003 (new body)
    with BuildSketch(Plane.XY.offset(2)):
        Circle(CYLINDER003_R)
    extrude(amount=CYLINDER003_DEPTH)


with BuildPart() as cylinder004:
    # cylinder004 → cylinder004 (revolve)
    with BuildSketch(Plane(origin=(0, 0, 3.5), x_dir=(1, 0, 0), z_dir=(0, -1, 0))):
        Polygon((0, 0), (8, 0), (7.5, 0.5), (0, 0.5), align=None)
    revolve(axis=Axis((0, 0, 3.5), (0, 0, 1)))


with BuildPart() as group003:
    # cylinder001 → cylinder001 (new body)
    with BuildSketch(Plane.XY):
        Circle(CYLINDER001_R)
    extrude(amount=CYLINDER001_DEPTH)

    # Matrix_Union: union cylinder002, cylinder003, cylinder004
    add(cylinder002.part)
    add(cylinder003.part)
    add(cylinder004.part)

    # Group003: union Matrix_Union001, Matrix_Union002, Matrix_Union003, Matrix_Union004, Matrix_Union005, Matrix_Union006
    add(matrix_union001_1.part)
    add(matrix_union002_1.part)
    add(matrix_union003_1.part)
    add(matrix_union004_1.part)
    add(matrix_union005_1.part)
    add(matrix_union006_1.part)


with BuildPart() as group003_1:
    # Group003 placement: moved
    add(group003.part.moved(Location((0, 0, 4))))


with BuildPart() as polebase:
    # cylinder → cylinder (new body)
    with BuildSketch(Plane.XY):
        Circle(CYLINDER_R)
    extrude(amount=CYLINDER_DEPTH)

    # union: union Group003
    add(group003_1.part)

    # difference: cut union001
    add(union001.part, mode=Mode.SUBTRACT)


solid = polebase.part
